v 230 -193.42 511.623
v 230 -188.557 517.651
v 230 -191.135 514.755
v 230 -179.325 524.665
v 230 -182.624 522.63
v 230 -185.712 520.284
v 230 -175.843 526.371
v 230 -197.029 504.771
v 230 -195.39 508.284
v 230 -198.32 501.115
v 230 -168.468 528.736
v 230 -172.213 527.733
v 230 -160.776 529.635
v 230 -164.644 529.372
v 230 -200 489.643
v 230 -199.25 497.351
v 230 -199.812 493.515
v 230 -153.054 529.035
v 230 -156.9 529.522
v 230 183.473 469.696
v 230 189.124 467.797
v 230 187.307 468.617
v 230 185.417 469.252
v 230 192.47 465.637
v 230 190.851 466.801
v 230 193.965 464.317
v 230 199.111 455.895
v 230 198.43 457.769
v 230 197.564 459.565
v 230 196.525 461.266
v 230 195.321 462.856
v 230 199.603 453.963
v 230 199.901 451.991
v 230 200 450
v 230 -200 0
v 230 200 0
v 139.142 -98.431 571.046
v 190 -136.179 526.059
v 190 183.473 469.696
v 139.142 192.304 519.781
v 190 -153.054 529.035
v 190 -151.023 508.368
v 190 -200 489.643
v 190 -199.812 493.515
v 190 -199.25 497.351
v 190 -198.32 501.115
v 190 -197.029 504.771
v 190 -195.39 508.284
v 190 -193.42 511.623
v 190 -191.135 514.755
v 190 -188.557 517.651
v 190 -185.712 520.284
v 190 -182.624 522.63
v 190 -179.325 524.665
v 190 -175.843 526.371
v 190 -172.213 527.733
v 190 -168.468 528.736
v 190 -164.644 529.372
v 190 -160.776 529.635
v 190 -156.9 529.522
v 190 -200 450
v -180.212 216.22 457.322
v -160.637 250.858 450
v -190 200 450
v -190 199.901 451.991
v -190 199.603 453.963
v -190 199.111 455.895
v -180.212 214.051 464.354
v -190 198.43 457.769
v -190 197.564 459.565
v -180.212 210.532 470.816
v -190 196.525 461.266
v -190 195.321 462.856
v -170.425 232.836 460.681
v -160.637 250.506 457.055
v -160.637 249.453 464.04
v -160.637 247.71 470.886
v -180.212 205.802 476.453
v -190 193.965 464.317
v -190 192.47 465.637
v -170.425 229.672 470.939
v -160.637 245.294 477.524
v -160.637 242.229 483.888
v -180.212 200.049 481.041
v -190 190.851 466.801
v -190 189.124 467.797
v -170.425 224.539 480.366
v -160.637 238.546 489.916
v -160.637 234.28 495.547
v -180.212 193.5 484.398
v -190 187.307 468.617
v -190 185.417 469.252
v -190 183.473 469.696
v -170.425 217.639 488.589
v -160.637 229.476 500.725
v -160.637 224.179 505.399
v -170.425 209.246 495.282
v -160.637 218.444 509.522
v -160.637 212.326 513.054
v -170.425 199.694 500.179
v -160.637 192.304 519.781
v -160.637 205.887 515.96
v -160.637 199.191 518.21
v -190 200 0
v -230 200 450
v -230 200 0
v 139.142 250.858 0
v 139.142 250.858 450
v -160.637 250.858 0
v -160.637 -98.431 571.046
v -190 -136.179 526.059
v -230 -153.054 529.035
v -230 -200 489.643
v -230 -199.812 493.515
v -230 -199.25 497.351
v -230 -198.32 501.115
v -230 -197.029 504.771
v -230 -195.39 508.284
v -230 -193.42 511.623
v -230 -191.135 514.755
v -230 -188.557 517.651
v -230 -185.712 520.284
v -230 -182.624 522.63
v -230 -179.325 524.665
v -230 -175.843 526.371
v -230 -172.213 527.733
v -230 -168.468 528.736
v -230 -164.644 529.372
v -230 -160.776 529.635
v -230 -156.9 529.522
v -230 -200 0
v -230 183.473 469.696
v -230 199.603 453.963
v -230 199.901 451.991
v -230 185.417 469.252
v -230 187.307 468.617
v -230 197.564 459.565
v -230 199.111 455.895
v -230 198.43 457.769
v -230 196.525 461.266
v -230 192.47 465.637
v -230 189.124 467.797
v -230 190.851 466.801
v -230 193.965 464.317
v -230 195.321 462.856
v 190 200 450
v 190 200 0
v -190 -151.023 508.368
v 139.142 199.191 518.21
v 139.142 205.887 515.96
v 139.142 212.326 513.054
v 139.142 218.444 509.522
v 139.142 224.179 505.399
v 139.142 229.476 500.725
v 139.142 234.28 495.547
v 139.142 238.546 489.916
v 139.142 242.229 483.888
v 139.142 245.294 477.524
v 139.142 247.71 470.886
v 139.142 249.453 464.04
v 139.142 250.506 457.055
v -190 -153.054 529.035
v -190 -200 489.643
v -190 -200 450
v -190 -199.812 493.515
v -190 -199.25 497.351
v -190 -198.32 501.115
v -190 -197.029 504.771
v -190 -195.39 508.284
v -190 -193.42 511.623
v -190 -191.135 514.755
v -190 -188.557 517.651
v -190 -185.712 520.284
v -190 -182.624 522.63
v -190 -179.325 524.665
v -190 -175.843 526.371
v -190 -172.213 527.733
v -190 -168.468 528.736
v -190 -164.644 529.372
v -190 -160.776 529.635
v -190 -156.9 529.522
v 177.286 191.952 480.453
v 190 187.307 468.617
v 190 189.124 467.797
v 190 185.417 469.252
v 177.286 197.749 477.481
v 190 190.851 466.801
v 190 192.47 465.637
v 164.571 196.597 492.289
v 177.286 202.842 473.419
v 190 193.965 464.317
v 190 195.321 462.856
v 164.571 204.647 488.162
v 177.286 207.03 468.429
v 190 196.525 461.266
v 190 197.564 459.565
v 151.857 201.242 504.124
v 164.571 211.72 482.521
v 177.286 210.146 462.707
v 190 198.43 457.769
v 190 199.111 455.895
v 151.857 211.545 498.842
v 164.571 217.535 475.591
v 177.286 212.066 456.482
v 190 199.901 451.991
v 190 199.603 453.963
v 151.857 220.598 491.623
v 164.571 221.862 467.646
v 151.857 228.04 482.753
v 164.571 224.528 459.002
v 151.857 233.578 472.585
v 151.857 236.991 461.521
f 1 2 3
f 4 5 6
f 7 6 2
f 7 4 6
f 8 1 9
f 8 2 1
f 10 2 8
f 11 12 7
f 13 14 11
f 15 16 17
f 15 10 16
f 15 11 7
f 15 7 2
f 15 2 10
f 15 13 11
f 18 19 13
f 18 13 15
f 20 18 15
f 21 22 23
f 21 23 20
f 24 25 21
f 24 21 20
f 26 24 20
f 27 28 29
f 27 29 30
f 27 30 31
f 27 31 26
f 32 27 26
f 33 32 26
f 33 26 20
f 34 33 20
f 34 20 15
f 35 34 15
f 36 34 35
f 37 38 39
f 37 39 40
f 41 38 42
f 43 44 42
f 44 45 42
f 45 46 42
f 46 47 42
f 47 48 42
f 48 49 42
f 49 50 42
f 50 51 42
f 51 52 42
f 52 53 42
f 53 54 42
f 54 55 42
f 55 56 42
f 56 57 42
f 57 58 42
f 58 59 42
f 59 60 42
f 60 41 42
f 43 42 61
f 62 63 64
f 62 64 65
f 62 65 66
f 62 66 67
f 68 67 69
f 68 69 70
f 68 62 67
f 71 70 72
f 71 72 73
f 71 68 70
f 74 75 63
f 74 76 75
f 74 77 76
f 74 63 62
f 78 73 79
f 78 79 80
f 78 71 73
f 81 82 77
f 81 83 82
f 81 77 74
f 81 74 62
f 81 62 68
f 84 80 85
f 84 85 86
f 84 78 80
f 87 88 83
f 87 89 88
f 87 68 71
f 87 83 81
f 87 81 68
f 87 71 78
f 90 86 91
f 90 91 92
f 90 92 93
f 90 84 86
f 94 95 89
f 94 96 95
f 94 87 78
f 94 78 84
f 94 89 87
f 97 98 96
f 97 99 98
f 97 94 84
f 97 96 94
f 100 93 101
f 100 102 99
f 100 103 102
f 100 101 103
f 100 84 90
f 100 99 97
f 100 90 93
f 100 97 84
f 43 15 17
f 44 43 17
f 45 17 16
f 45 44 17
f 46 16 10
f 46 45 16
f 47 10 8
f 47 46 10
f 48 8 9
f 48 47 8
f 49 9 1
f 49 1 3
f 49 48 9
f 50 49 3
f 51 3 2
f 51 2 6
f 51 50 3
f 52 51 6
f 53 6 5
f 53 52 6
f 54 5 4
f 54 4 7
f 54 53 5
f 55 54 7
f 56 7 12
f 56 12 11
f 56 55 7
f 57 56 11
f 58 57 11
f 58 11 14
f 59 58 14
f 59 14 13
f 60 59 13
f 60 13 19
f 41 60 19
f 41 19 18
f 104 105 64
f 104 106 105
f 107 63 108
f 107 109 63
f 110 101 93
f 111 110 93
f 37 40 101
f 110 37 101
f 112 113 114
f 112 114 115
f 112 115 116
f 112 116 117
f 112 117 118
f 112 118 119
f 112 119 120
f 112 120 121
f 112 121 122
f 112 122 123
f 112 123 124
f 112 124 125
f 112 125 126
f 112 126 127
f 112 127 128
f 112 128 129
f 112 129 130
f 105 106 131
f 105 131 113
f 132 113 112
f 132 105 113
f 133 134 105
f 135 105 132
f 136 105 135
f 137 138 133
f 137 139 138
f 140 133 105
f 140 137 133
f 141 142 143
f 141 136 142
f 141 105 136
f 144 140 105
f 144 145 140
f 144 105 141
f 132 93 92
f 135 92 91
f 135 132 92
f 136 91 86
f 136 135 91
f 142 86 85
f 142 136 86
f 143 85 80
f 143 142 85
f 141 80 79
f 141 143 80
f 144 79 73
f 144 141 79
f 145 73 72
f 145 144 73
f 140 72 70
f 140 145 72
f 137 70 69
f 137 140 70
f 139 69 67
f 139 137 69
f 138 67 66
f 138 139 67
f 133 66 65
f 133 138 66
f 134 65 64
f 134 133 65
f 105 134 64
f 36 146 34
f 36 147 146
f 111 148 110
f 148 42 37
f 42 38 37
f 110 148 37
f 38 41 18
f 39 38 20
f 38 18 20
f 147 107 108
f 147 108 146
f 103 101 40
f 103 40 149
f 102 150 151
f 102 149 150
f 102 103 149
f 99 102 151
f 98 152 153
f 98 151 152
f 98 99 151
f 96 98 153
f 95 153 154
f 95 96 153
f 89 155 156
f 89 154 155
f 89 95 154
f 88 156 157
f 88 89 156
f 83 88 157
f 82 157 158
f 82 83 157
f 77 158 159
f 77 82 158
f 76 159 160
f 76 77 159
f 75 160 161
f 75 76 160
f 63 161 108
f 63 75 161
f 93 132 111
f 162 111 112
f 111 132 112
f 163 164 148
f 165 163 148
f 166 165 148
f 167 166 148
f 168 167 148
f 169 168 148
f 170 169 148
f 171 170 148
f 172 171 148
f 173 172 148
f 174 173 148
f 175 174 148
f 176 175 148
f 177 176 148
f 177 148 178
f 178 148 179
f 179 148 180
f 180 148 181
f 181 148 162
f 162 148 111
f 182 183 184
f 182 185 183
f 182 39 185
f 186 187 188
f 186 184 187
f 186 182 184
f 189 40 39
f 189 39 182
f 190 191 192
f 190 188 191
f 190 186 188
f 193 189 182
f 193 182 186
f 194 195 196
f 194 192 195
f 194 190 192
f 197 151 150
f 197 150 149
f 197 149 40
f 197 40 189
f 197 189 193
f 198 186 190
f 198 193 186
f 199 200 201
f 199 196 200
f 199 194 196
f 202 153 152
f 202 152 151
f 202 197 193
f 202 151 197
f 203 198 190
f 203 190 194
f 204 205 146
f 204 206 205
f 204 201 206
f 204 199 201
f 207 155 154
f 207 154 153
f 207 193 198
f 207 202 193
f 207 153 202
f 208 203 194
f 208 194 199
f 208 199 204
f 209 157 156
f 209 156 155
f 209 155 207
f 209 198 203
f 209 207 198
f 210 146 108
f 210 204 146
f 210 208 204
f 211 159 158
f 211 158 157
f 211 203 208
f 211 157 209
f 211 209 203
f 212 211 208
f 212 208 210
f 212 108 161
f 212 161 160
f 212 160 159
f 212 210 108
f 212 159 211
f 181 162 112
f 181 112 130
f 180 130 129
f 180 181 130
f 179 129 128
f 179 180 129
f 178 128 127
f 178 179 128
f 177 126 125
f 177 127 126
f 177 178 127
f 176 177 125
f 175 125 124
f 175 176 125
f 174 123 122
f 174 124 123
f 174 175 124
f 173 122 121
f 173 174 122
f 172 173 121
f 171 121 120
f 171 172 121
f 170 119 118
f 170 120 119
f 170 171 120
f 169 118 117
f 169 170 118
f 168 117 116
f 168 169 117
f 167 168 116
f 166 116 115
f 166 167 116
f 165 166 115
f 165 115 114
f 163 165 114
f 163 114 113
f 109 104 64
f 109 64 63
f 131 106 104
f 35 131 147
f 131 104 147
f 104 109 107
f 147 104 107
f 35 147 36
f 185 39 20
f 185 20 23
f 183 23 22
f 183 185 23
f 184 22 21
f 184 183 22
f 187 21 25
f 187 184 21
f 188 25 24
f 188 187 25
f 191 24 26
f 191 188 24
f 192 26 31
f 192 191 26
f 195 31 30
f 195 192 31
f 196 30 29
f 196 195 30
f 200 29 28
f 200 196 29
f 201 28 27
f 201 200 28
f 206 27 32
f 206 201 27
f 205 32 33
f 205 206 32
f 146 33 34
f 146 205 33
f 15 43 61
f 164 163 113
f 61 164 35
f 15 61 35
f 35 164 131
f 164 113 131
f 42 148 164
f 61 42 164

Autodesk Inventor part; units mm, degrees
ref_plane "YZ Plane" through (0, 0, 0) normal (1, 0, 0) x (0, 1, 0)
sketch "Sketch1" plane through (0, 0, 0) normal (0, 0, 1) x (1, 0, 0)
  line L0 (230, -200) -> (-230, -200)
  line L1 (-230, -200) -> (-230, 200)
  line L2 (-230, 200) -> (230, 200)
  line L3 (230, 200) -> (230, -200)
  line L4 (230, -200) -> (-230, 200) construction
  line L5 (-230, -200) -> (230, 200) construction
  line L6 (-190, 200) -> (-160.6372, 250.8579)
  line L7 (-160.6372, 250.8579) -> (139.1421, 250.8579)
  line L8 (139.1421, 250.8579) -> (190, 200)
  line L9 (139.1421, 250.8579) -> (122.8634, 211.5574) construction
  line L10 (135, 250.8579) -> (135, 240.8579) construction
  line L11 (230, 200) -> (190, 200)
  line L12 (190, 200) -> (190, 160)
  line L13 (190, 160) -> (230, 160)
  line L14 (230, 160) -> (230, 200)
  line L15 (-150, 110) -> (150, 110)
  line L16 (150, 110) -> (150, -140)
  line L17 (150, -140) -> (-150, -140)
  line L18 (-150, -140) -> (-150, 110)
  line L19 (-230, -200) -> (-190, -200)
  line L20 (-190, -200) -> (-190, -160)
  line L21 (-190, -160) -> (-230, -160)
  line L22 (-230, -160) -> (-230, -200)
  line L23 (230, -200) -> (190, -200)
  line L24 (190, -200) -> (190, -160)
  line L25 (190, -160) -> (230, -160)
  line L26 (230, -160) -> (230, -200)
  line L27 (-230, 200) -> (-190, 200)
  line L28 (-190, 200) -> (-190, 160)
  line L29 (-190, 160) -> (-230, 160)
  line L30 (-230, 160) -> (-230, 200)
  line L31 (-40, 200) -> (40, 200)
  line L32 (40, 200) -> (40, 160)
  line L33 (40, 160) -> (-40, 160)
  line L34 (-40, 160) -> (-40, 200)
  line L35 (125, 250.8579) -> (135, 250.8579)
  line L36 (135, 250.8579) -> (135, 230.8579)
  line L37 (135, 230.8579) -> (125, 230.8579)
  line L38 (125, 230.8579) -> (125, 250.8579)
  line L39 (149.1421, 240.8579) -> (142.0711, 247.9289)
  line L40 (142.0711, 247.9289) -> (127.9289, 233.7868)
  line L41 (127.9289, 233.7868) -> (134.2929, 227.4228)
  line L42 (135.7071, 227.4228) -> (149.1421, 240.8579)
  line L43 (135, 200) -> (132, 200)
  line L44 (132, 200) -> (132, 239)
  line L45 (132, 239) -> (135, 239)
  line L46 (135, 239) -> (135, 200)
  line L47 (135, 200) -> (95, 200)
  line L48 (95, 200) -> (95, 180)
  line L49 (95, 180) -> (135, 180)
  line L50 (135, 180) -> (135, 200)
  line L51 (-222, 80) -> (-132, 80)
  line L52 (-132, 80) -> (-132, -140)
  line L53 (-132, -140) -> (-222, -140)
  line L54 (-222, -140) -> (-222, 80)
  circle A0 centre (-112, -40) radius 100
  circle A1 centre (112, -40) radius 100
  line L55 (-230, -40) -> (230, -40) construction
  line L56 (-112, -40) -> (112, -40)
  arc A2 (134.2929, 227.4228) -> (135.7071, 227.4228) centre (135, 228.1299) ccw
  point P0 (0, 0)
  point P1 (0, 110)
  point P2 (0, 200)
  point P3 (135, 226.7157)
  point P4 (0, -40)
  dimension "d0" = 460
  dimension "d1" = 400
  dimension "d2" = 40
  dimension "d3" = 40
  dimension "d4" = 120
  dimension "d5" = 135
  dimension "d30" = 67.5
  dimension "d32" = 10
  dimension "d34" = 50.8579
  dimension "d35" = 40
  dimension "d36" = 40
  dimension "d37" = 300
  dimension "d38" = 250
  dimension "d39" = 60
  dimension "d40" = 40
  dimension "d41" = 40
  dimension "d42" = 40
  dimension "d43" = 40
  dimension "d44" = 40
  dimension "d45" = 40
  dimension "d46" = 80
  dimension "d47" = 40
  dimension "d48" = 10
  dimension "d50" = 10
  dimension "d51" = 3
  dimension "d52" = 39
  dimension "d53" = 40
  dimension "d54" = 20
  dimension "d55" = 55
  dimension "d56" = 105
  dimension "d57" = 90
  dimension "d58" = 220
  dimension "d59" = 8
  dimension "d60" = 20
  dimension "d61" = 55
  dimension "d63" = 200
  dimension "d64" = 160
  dimension "d65" = 118
  dimension "d66" = 1
extrude "Extrusion1" add sketch "Sketch1" along normal blind 450 contours L0 L24 L25 L3 | L0 L20 L21 L1 L29 L28 L2 L34 L33 L32 L48 L49 L50 L12 L13 L3 L25 L24 | L0 L1 L21 L20 | L13 L12 L2 L3 | L2 L46 A2 L42 L8 | L1 L2 L28 L29 | L50 L49 L48 L2 | L2 L44 L41 A2 L46 | L42 A2 L46 L36 L40 L8 | L2 L6 L7 L38 L37 L41 L44 | A2 L41 L44 L37 L46 | L40 L36 L7 L8 | L41 L37 L44 | L37 L44 L40 L45 L36 | L40 L45 L44 L41 L37 L38 L7 L36 | L36 L45 L40 | L2 L32 L33 L34 | L41 L40 L44 L37 | L40 L44 L45 | L15 L16 A1 L56 A0 L52 L51 L18 | L51 L52 A0 L18 | L18 A0 L53 L54 L51 | A1 L16 | L16 A1 | A0 L52 L18 | L18 A0 | L16 L17 A1 | A1 L17 A0 L56 | A0 L52 L17 L18 | A0 L52 | A0 L17 L52
sketch "Sketch2" plane through (0, 0, 450) normal (0, 0, 1) x (1, 0, 0)
  line L0 (-160.6372, 250.8579) -> (-190, 200) projected
  line L1 (-190, 200) -> (-230, 200) projected
  line L2 (-230, 200) -> (-230, -200) projected
  line L3 (-230, -200) -> (230, -200) projected
  line L4 (230, -200) -> (230, 200) projected
  line L5 (230, 200) -> (190, 200) projected
  line L6 (190, 200) -> (139.1421, 250.8579) projected
  line L7 (139.1421, 250.8579) -> (-160.6372, 250.8579) projected
  line L8 (230, 180) -> (-230, 180)
  point P0 (0, 0)
  dimension "d9" = 20
revolve "Revolution1" add sketch "Sketch2" angle 80 about axis through (230, 180, 450) along (1, 0, 0) contours L7 L6 L5 L4 L8 L2 L1 L0
sketch "Sketch3" plane through (-230, 180, 450) normal (0, -0.9848078, 0.1736482) x (1, 0, 0)
  line L0 (0, 20) -> (0, 0) projected
  line L1 (460, 0) -> (0, 0) projected
  line L2 (460, 0) -> (460, 20) projected
  line L3 (460, 20) -> (420, 20) projected
  line L4 (420, 20) -> (369.1421, 70.8579) projected
  line L5 (369.1421, 70.8579) -> (69.3628, 70.8579) projected
  line L6 (69.3628, 70.8579) -> (40, 20) projected
  line L7 (40, 20) -> (0, 20) projected
  point P0 (230, -474.4202)
ref_plane "Work Plane4" through (-230, -208.6603, 455) normal (0, 0.8660254, -0.5) x (1, 0, 0)
ref_plane "Work Plane3" through (-230, -200, 450) normal (0, 0.8660254, -0.5) x (1, 0, 0)
sketch "Sketch7" plane through (230, -200, 0) normal (1, 0, 0) x (0, 0, -1)
  line L0 (0, 0) -> (0, 400) projected
  line L1 (0, 400) -> (-450, 400) projected
  arc A0 (-450, 400) -> (-469.6962, 383.473) centre (-450, 380) ccw projected
  line L2 (-450, 380) -> (-469.6962, 383.473) projected
  line L3 (-450, 0) -> (-450, 380) projected
  line L4 (0, 0) -> (-450, 0) projected
  line L5 (-450, 0) -> (-537.3128, 0)
  line L6 (-537.3128, 0) -> (-469.6962, 383.473)
  arc A1 (-450, 400) -> (-469.6962, 383.473) centre (-450, 380) ccw projected
  line L7 (-450, 380) -> (-469.6962, 383.473) projected
  point P0 (0, 200)
extrude "Extrusion7" add sketch "Sketch7" against normal blind 40 contours L5 L6 L2 L3
fillet "Fillet6" radius 40 1 edges at (210, -200, 537.3128)
mirror "Mirror1" about plane through (0, 0, 0) normal (1, 0, 0) of "Extrusion7", "Fillet6"
ref_plane "Work Plane5" through (-230, -200, 450) normal (0, 0.7660444, -0.6427876) x (1, 0, 0)
sketch "Sketch9" plane through (-160.6372, 192.3043, 519.7814) normal (0, -0.9848078, 0.1736482) x (1, 0, 0)
  line L0 (-29.3628, -50.8579) -> (-29.3628, -70.8579) projected
  line L1 (350.6372, -70.8579) -> (-29.3628, -70.8579) projected
  line L2 (350.6372, -70.8579) -> (350.6372, -50.8579) projected
  line L3 (350.6372, -50.8579) -> (299.7793, 0) projected
  line L4 (299.7793, 0) -> (0, 0) projected
  line L5 (0, 0) -> (-29.3628, -50.8579) projected
  point P0 (160.6372, -545.278)
extrude "Extrusion8" add sketch "Sketch9" along normal up to surface surface through (-230, -200, 450) normal (0, 0.7660444, -0.6427876)
sketch "Sketch11" plane through (190, -200, 0) normal (-1, 0, 0) x (0, 0, 1)
  line L0 (526.0594, 63.8214) -> (508.3683, 48.9768) projected
  line L1 (508.3683, 48.9768) -> (450, 380) projected
  line L2 (450, 0) -> (450, 380) projected
  line L3 (450, 0) -> (489.6426, 0) projected
  arc A0 (489.6426, 0) -> (529.035, 46.9459) centre (489.6426, 40) ccw projected
  line L4 (529.035, 46.9459) -> (526.0594, 63.8214) projected
  line L5 (508.4341, 49.0321) -> (450, 0)
  point P0 (0, 200)
  point P1 (508.3683, 48.9768)
extrude "Extrusion9" add sketch "Sketch11" along normal up to next contours L5 L2 L1
sketch "Sketch6" plane through (-230, -200, 0) normal (-1, 0, 0) x (0, 0, 1)
  line L0 (0, 400) -> (0, 0) projected
  line L1 (0, 0) -> (450, 0) projected
  line L2 (450, 380) -> (450, 0) projected
  line L3 (450, 380) -> (512.6612, 24.6305) projected
  line L4 (531.0933, 35.2723) -> (512.6612, 24.6305) projected
  line L5 (469.6962, 383.473) -> (531.0933, 35.2723) projected
  arc A0 (469.6962, 383.473) -> (450, 400) centre (450, 380) ccw projected
  line L6 (0, 400) -> (450, 400) projected
  line L7 (512.6612, 24.6305) -> (470, 0)
  line L8 (470, 0) -> (450, 0)
  point P0 (0, 200)
equation "\"d30\" = 0.5 * d5"
properties part number "RevII Printer Envelope Study"
